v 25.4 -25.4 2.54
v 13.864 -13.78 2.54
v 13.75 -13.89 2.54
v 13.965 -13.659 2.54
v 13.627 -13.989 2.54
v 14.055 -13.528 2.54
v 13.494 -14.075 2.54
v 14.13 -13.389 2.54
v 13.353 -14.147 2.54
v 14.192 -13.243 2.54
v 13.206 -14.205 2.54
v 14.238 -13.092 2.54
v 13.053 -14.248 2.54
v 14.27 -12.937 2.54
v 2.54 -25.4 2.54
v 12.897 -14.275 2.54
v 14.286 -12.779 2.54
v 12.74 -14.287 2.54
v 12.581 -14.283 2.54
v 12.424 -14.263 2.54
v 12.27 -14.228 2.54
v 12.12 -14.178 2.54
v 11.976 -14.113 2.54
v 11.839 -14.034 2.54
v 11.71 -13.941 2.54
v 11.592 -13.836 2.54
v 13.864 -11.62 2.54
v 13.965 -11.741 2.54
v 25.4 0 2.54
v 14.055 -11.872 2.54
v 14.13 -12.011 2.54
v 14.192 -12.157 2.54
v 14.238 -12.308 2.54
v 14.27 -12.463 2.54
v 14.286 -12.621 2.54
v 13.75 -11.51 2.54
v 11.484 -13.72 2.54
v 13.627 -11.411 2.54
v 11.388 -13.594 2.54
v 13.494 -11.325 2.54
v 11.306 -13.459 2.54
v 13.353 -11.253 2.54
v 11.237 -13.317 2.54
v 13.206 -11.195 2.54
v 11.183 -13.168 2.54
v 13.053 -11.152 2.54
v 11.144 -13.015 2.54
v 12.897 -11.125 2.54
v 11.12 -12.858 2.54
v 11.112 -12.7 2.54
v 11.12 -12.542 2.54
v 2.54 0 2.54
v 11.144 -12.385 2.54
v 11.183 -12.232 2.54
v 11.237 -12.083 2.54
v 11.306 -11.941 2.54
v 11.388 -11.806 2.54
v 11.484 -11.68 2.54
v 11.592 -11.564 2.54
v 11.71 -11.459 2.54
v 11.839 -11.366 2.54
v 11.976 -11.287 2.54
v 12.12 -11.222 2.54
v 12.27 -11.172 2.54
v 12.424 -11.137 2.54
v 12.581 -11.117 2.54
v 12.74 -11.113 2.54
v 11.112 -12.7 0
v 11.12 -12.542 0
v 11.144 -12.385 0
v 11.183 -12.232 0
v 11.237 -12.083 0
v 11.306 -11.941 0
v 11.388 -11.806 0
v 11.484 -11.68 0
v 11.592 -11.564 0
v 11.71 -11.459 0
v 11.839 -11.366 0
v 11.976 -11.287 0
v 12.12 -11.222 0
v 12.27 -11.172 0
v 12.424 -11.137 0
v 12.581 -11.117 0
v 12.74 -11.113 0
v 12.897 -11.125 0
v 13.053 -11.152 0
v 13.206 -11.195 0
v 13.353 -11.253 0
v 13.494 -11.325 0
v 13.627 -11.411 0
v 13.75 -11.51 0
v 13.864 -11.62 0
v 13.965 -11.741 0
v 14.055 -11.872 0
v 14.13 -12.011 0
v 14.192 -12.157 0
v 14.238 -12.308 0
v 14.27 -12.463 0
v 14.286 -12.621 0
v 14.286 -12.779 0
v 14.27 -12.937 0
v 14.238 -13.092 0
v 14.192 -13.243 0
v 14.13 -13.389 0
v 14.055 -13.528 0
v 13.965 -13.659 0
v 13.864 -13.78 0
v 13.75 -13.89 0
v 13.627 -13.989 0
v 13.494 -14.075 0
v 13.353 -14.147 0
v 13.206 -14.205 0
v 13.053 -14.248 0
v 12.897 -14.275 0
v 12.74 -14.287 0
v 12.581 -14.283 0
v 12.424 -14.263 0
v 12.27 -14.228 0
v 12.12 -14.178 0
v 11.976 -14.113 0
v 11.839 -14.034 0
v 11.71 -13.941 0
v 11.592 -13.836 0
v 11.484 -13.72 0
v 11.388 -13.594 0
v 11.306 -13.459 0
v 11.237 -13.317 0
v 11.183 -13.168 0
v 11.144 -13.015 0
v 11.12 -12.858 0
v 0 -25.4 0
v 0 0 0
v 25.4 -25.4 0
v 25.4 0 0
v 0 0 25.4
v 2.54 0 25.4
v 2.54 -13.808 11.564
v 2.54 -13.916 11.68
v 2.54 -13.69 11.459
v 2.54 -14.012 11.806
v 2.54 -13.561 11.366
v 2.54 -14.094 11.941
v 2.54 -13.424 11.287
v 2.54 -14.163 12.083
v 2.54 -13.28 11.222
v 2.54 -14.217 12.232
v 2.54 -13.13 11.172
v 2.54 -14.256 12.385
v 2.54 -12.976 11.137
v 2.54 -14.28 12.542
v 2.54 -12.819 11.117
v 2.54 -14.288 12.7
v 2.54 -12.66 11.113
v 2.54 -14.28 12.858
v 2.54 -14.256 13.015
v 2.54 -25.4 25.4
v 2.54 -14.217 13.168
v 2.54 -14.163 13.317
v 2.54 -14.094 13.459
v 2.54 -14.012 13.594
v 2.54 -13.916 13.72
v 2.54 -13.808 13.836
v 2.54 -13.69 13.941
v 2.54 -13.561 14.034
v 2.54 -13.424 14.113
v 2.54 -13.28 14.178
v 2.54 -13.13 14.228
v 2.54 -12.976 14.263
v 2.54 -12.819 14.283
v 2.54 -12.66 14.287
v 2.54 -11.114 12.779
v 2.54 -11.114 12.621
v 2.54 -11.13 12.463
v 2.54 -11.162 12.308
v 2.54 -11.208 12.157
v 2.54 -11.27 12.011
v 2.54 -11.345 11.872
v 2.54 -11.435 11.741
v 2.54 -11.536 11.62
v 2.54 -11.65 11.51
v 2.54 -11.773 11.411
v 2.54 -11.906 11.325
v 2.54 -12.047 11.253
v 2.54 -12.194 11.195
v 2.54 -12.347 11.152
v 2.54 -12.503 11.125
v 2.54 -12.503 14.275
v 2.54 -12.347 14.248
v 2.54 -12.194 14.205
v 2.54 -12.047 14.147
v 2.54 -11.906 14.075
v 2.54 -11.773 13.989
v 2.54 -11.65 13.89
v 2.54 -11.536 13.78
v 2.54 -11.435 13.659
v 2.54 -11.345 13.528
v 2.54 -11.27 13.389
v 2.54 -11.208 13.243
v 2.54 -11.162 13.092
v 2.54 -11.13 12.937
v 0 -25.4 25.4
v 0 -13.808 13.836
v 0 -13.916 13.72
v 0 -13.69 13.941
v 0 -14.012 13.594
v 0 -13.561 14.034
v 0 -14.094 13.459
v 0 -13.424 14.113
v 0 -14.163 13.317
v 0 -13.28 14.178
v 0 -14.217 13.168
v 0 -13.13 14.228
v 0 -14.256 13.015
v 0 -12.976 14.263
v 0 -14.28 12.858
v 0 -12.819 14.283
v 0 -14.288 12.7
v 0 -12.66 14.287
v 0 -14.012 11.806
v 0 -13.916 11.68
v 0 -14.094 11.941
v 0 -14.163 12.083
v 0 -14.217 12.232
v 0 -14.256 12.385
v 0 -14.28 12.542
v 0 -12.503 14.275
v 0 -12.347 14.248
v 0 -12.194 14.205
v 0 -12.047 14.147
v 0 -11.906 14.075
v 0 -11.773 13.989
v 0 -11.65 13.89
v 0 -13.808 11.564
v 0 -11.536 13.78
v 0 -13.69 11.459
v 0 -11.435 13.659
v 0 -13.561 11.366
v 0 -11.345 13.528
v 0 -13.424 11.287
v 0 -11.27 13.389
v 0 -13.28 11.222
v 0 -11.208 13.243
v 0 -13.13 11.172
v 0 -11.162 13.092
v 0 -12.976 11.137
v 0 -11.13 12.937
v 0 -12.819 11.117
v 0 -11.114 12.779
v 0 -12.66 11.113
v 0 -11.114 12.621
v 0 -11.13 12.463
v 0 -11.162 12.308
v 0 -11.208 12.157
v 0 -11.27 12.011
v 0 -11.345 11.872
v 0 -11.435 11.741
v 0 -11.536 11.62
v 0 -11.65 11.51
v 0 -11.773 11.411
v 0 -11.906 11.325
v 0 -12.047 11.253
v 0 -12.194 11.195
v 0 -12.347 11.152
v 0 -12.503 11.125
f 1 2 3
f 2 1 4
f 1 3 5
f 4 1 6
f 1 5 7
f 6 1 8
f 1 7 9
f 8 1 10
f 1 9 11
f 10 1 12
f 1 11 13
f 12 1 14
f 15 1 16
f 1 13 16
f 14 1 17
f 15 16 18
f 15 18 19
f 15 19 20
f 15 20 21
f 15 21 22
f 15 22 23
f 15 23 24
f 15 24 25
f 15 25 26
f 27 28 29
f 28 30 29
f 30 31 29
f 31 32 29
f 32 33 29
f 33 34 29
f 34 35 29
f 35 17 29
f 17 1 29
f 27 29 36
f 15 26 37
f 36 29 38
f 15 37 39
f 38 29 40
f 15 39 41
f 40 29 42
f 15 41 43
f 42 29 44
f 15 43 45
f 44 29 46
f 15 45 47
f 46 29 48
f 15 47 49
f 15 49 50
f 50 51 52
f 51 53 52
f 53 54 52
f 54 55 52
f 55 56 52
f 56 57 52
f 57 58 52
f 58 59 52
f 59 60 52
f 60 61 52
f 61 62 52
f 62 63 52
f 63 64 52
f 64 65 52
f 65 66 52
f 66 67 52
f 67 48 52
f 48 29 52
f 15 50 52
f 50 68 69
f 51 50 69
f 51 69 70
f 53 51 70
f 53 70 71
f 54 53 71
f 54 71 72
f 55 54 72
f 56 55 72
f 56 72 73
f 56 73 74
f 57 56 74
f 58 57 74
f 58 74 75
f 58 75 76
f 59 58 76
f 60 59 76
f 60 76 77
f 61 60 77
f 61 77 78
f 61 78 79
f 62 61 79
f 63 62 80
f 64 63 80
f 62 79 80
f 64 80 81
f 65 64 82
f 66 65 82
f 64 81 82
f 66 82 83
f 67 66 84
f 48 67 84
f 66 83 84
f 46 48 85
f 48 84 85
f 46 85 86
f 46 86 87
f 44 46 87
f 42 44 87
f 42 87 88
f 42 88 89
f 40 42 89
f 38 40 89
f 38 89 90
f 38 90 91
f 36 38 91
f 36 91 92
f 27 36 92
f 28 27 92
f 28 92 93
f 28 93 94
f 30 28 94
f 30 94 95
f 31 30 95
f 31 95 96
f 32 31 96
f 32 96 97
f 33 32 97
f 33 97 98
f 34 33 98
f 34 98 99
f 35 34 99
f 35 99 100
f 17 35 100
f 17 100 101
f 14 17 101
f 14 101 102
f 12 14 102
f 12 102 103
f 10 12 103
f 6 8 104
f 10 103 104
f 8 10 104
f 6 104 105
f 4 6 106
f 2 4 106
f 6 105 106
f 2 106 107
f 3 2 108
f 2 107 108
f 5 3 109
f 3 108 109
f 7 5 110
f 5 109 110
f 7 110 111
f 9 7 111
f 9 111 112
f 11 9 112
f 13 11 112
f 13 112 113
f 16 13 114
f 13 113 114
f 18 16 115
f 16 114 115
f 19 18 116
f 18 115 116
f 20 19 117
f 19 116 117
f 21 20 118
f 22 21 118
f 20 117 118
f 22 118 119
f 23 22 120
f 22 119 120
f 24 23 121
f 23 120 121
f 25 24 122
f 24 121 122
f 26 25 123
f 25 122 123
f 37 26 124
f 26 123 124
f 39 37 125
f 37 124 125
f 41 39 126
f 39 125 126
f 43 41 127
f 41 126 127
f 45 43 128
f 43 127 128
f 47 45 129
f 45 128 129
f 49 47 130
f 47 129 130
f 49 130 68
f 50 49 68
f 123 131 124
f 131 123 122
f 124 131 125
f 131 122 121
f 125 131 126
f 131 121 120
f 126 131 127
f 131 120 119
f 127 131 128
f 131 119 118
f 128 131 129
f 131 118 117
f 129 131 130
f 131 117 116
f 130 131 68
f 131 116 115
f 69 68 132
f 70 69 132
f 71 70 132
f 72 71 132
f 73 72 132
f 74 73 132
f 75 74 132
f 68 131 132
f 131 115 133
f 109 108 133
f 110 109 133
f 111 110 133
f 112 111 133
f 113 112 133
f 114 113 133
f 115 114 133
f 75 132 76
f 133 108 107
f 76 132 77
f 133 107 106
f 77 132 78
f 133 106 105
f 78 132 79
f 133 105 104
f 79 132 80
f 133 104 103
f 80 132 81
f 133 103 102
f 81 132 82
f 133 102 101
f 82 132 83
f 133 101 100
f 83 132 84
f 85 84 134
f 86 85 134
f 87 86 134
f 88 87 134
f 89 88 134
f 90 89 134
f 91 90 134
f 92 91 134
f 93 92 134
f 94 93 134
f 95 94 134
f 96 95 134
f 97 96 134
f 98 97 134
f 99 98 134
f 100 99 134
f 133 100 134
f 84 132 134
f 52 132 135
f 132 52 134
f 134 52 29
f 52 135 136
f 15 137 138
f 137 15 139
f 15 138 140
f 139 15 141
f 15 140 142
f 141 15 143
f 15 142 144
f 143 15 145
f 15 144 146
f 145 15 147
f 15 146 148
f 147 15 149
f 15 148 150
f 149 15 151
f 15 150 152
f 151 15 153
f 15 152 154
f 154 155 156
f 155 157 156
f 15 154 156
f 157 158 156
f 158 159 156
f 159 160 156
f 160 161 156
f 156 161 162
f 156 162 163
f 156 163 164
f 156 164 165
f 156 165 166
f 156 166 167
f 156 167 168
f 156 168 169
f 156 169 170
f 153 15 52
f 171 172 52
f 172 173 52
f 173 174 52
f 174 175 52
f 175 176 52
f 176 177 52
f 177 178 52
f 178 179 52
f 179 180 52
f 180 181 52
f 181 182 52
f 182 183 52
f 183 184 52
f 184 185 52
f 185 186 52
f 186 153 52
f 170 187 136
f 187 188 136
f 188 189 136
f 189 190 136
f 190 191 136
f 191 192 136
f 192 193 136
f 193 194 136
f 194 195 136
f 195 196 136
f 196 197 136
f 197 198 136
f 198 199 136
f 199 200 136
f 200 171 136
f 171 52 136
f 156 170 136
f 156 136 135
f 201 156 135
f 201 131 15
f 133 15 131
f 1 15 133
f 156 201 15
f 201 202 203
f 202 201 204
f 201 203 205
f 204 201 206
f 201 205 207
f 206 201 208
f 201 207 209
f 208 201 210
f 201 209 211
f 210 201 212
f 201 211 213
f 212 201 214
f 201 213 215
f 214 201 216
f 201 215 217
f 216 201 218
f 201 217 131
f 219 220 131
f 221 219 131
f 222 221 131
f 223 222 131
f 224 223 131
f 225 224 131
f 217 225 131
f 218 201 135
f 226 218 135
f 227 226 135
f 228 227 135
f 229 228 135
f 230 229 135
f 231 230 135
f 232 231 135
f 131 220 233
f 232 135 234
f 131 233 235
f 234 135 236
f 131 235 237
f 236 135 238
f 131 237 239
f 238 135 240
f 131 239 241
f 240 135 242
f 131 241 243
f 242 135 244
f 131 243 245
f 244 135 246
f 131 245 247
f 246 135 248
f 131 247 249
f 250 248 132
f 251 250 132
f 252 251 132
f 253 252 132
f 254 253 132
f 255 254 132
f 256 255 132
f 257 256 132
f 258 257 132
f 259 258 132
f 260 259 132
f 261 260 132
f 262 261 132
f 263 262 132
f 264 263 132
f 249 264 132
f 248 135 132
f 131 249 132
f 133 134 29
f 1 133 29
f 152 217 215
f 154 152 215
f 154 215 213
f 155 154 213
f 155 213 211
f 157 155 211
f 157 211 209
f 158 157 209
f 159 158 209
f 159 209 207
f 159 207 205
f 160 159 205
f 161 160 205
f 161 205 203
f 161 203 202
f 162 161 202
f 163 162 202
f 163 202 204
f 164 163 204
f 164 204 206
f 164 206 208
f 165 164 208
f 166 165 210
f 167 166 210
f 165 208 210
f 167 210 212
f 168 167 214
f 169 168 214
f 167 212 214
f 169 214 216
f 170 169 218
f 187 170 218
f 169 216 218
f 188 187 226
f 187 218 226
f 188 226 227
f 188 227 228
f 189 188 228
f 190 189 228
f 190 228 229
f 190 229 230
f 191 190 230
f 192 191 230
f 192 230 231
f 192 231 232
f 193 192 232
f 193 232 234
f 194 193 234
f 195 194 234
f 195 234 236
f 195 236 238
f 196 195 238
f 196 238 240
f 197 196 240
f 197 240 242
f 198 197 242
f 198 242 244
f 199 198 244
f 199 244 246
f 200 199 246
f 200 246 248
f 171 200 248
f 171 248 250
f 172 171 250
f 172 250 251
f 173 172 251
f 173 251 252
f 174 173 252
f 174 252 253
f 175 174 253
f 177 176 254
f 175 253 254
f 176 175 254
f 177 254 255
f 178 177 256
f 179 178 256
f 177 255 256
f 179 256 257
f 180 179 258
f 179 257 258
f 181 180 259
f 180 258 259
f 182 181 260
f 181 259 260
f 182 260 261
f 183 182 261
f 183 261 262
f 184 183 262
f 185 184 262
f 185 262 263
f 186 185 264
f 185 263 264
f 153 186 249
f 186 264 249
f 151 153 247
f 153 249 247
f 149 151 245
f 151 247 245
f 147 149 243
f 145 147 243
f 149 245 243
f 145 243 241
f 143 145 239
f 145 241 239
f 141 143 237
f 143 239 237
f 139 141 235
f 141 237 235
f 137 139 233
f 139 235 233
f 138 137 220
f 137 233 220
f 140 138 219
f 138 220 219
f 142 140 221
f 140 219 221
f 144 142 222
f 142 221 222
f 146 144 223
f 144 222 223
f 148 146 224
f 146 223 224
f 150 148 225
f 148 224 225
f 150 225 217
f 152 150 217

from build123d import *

# Parameters (mm, degrees)
F1_DEPTH   = 25.4
F4_D       = 3.175
F4_ON_F3_D = 3.175


with BuildPart() as f1:
    # F0 (on Front) → F1 (new body)
    with BuildSketch(Plane.XZ):
        Polygon((0, 25.4), (0, 0), (25.4, 0), (25.4, 2.54), (2.54, 2.54), (2.54, 25.4), align=None)
    extrude(amount=F1_DEPTH)

    # F4 (through all)
    with Locations(Plane.YZ.offset(2.54)):
        with Locations((-12.7, 12.7)):
            Hole(F4_D / 2)

    # F4 on F3 (through all)
    with Locations(Plane.XY.offset(2.54)):
        with Locations((12.7, -12.7)):
            Hole(F4_ON_F3_D / 2)


solid = f1.part
